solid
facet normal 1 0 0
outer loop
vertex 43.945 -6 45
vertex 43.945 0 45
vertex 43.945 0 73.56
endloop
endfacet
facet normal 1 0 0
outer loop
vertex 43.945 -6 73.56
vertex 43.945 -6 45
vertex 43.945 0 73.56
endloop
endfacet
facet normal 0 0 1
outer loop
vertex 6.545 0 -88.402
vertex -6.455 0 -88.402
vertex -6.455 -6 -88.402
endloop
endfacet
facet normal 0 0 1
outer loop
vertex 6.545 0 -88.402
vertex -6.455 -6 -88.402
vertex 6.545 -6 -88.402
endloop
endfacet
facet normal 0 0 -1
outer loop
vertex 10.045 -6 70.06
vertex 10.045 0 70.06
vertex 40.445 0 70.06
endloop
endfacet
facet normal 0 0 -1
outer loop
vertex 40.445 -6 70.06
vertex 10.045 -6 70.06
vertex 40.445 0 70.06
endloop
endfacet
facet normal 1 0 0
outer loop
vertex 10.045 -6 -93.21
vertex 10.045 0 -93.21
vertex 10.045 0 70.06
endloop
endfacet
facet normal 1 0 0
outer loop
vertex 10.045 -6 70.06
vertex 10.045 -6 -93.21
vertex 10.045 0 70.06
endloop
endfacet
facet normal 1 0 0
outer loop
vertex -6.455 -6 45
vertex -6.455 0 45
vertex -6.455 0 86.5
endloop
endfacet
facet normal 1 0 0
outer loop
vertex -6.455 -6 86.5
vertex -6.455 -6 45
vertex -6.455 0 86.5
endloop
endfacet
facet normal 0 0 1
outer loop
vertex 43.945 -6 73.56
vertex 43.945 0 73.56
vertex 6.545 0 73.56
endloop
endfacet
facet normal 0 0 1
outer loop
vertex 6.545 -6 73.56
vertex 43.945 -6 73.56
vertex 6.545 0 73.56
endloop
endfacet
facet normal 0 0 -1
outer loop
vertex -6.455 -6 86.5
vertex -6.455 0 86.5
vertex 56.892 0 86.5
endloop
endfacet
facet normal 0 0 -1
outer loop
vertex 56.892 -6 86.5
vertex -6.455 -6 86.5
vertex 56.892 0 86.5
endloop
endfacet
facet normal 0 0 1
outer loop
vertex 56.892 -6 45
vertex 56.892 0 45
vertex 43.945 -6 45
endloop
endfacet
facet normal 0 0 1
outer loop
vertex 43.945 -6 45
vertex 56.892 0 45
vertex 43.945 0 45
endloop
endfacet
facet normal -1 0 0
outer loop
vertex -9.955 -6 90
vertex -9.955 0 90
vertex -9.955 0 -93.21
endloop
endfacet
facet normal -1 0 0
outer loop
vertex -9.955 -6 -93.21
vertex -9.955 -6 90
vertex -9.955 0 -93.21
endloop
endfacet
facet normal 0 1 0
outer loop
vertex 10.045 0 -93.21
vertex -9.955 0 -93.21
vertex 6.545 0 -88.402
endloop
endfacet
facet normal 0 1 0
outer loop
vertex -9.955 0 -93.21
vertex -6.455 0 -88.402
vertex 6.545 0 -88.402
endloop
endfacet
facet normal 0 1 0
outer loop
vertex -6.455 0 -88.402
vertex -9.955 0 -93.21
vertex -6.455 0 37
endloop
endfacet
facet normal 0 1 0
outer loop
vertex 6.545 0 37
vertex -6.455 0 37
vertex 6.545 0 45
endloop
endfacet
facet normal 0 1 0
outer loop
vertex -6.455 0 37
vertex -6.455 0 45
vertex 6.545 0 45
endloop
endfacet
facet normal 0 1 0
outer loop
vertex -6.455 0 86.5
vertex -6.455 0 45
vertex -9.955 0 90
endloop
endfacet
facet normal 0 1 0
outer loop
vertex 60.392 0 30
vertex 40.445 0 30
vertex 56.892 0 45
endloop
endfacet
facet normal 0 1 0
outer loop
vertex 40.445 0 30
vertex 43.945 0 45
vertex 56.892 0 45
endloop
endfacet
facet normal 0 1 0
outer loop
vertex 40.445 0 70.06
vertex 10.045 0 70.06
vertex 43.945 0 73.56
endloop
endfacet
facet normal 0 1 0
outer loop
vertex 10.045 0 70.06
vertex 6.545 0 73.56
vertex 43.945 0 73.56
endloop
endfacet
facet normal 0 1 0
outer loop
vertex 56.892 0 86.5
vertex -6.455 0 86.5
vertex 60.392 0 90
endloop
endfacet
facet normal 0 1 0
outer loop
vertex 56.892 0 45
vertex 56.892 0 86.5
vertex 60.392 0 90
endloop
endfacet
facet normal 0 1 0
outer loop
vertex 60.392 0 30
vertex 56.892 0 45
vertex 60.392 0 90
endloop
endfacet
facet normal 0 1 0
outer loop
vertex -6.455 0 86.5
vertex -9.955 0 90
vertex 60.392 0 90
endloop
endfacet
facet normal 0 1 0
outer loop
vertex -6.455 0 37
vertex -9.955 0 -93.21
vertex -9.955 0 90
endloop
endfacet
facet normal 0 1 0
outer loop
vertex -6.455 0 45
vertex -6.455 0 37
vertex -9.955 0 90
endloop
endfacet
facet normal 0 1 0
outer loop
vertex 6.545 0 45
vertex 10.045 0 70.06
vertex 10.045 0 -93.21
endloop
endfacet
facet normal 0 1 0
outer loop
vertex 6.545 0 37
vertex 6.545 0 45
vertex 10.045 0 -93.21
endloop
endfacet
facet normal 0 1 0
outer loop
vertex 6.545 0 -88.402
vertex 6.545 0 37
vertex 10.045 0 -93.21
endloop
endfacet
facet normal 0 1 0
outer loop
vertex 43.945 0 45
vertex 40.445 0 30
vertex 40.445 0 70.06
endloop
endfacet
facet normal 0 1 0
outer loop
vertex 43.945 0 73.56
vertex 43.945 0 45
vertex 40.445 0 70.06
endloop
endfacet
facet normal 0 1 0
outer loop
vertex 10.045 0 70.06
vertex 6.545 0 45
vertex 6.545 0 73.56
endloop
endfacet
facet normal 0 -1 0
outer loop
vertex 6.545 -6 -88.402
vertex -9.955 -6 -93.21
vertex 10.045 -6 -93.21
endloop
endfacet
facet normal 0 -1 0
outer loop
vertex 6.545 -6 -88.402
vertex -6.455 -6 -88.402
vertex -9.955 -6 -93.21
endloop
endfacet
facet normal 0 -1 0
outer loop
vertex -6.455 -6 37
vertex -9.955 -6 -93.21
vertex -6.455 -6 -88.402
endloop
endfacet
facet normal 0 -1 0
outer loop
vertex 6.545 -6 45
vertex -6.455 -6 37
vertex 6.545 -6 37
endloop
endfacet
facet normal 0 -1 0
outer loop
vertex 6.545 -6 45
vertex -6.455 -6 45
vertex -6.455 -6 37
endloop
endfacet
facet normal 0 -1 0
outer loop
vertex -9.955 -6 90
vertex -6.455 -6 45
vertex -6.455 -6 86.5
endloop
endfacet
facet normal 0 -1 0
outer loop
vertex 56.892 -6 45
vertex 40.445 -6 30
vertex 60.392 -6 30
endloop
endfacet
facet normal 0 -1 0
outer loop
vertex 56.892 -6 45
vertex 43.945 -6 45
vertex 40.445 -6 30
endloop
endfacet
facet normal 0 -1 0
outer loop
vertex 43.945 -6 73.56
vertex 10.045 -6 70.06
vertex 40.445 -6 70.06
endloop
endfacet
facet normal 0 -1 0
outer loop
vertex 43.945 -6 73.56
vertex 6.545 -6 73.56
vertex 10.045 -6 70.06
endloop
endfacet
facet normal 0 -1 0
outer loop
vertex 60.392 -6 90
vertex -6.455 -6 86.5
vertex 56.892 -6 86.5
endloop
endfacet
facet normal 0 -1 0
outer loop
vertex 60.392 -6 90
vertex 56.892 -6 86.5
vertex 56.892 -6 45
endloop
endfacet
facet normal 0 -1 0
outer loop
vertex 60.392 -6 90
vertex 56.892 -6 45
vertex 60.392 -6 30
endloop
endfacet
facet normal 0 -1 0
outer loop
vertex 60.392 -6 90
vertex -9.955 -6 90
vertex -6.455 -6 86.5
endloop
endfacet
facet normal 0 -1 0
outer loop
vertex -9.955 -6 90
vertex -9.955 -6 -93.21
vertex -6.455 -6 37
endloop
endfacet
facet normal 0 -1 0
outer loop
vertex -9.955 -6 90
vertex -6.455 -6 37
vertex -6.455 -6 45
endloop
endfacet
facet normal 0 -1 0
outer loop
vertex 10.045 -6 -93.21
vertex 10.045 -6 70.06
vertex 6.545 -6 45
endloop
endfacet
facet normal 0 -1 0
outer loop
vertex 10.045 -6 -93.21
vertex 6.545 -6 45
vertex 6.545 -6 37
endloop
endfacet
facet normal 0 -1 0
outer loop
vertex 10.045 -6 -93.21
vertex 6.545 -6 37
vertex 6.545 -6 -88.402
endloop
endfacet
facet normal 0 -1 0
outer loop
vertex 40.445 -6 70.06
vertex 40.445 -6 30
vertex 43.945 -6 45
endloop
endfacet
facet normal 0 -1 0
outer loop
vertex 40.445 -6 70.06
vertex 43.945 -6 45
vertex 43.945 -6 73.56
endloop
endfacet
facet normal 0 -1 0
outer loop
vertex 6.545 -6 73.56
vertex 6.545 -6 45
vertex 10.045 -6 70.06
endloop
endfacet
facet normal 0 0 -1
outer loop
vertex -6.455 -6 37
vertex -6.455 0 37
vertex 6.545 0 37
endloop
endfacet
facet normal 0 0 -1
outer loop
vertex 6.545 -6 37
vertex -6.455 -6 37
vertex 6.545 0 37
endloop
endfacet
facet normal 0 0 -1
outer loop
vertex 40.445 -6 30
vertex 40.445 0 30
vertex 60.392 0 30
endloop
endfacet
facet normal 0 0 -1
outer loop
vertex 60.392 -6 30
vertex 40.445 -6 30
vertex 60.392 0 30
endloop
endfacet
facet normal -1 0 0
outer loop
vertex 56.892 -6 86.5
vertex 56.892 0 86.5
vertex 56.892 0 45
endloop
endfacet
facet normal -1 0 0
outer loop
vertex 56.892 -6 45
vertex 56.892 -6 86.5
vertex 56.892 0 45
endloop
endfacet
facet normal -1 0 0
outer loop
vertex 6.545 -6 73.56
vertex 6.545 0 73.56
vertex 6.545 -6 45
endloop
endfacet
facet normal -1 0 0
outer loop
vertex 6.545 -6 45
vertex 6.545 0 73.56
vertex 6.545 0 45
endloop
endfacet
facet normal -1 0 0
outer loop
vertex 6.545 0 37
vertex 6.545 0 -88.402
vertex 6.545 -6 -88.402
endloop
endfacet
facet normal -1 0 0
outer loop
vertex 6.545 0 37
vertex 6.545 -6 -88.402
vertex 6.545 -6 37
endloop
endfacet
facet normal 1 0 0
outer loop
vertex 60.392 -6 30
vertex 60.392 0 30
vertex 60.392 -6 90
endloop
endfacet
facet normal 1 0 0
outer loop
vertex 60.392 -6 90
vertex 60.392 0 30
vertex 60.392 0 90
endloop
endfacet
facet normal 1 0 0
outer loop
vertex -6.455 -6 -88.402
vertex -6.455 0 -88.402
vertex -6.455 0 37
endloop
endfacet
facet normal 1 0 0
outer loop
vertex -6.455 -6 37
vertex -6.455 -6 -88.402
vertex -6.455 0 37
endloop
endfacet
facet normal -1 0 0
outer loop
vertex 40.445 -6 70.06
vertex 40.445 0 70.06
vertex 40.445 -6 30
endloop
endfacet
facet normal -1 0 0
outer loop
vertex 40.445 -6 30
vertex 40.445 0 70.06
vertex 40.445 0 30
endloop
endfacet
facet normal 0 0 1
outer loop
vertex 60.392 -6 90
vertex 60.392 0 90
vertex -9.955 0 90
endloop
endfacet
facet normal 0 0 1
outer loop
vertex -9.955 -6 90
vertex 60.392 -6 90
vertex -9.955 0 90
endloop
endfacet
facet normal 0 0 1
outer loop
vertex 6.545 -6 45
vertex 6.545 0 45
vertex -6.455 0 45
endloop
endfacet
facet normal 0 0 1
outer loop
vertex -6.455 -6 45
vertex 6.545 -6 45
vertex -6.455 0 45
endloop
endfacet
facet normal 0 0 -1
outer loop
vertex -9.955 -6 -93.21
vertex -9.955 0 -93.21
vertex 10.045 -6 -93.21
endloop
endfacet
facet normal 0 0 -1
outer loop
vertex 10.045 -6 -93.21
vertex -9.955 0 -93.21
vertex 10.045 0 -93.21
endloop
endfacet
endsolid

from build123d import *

# Parameters (mm, degrees)
F0_W     = 13
F0_H     = 125.402425
F1_DEPTH = 6


with BuildPart() as f1:
    # F0 (on Front) → F1 (new body)
    with BuildSketch(Plane.XZ):
        Polygon((60.391705, 30.000078), (60.391705, 90.000078), (-9.955426, 90.000078), (-9.955426, -93.209804), (10.044574, -93.209804), (10.044574, 70.060078), (40.444729, 70.060078), (40.444729, 30.000078), align=None)
        with Locations((0.044574, -25.701134)):
            Rectangle(F0_W, F0_H, mode=Mode.SUBTRACT)
        Polygon((6.544574, 45.000078), (-6.455426, 45.000078), (-6.455426, 73.97807), (-6.455426, 86.500078), (56.891705, 86.500078), (56.891705, 73.97807), (56.891705, 45.000078), (43.944729, 45.000078), (43.944729, 73.560078), (6.544574, 73.560078), align=None, mode=Mode.SUBTRACT)
    extrude(amount=F1_DEPTH)


solid = f1.part
